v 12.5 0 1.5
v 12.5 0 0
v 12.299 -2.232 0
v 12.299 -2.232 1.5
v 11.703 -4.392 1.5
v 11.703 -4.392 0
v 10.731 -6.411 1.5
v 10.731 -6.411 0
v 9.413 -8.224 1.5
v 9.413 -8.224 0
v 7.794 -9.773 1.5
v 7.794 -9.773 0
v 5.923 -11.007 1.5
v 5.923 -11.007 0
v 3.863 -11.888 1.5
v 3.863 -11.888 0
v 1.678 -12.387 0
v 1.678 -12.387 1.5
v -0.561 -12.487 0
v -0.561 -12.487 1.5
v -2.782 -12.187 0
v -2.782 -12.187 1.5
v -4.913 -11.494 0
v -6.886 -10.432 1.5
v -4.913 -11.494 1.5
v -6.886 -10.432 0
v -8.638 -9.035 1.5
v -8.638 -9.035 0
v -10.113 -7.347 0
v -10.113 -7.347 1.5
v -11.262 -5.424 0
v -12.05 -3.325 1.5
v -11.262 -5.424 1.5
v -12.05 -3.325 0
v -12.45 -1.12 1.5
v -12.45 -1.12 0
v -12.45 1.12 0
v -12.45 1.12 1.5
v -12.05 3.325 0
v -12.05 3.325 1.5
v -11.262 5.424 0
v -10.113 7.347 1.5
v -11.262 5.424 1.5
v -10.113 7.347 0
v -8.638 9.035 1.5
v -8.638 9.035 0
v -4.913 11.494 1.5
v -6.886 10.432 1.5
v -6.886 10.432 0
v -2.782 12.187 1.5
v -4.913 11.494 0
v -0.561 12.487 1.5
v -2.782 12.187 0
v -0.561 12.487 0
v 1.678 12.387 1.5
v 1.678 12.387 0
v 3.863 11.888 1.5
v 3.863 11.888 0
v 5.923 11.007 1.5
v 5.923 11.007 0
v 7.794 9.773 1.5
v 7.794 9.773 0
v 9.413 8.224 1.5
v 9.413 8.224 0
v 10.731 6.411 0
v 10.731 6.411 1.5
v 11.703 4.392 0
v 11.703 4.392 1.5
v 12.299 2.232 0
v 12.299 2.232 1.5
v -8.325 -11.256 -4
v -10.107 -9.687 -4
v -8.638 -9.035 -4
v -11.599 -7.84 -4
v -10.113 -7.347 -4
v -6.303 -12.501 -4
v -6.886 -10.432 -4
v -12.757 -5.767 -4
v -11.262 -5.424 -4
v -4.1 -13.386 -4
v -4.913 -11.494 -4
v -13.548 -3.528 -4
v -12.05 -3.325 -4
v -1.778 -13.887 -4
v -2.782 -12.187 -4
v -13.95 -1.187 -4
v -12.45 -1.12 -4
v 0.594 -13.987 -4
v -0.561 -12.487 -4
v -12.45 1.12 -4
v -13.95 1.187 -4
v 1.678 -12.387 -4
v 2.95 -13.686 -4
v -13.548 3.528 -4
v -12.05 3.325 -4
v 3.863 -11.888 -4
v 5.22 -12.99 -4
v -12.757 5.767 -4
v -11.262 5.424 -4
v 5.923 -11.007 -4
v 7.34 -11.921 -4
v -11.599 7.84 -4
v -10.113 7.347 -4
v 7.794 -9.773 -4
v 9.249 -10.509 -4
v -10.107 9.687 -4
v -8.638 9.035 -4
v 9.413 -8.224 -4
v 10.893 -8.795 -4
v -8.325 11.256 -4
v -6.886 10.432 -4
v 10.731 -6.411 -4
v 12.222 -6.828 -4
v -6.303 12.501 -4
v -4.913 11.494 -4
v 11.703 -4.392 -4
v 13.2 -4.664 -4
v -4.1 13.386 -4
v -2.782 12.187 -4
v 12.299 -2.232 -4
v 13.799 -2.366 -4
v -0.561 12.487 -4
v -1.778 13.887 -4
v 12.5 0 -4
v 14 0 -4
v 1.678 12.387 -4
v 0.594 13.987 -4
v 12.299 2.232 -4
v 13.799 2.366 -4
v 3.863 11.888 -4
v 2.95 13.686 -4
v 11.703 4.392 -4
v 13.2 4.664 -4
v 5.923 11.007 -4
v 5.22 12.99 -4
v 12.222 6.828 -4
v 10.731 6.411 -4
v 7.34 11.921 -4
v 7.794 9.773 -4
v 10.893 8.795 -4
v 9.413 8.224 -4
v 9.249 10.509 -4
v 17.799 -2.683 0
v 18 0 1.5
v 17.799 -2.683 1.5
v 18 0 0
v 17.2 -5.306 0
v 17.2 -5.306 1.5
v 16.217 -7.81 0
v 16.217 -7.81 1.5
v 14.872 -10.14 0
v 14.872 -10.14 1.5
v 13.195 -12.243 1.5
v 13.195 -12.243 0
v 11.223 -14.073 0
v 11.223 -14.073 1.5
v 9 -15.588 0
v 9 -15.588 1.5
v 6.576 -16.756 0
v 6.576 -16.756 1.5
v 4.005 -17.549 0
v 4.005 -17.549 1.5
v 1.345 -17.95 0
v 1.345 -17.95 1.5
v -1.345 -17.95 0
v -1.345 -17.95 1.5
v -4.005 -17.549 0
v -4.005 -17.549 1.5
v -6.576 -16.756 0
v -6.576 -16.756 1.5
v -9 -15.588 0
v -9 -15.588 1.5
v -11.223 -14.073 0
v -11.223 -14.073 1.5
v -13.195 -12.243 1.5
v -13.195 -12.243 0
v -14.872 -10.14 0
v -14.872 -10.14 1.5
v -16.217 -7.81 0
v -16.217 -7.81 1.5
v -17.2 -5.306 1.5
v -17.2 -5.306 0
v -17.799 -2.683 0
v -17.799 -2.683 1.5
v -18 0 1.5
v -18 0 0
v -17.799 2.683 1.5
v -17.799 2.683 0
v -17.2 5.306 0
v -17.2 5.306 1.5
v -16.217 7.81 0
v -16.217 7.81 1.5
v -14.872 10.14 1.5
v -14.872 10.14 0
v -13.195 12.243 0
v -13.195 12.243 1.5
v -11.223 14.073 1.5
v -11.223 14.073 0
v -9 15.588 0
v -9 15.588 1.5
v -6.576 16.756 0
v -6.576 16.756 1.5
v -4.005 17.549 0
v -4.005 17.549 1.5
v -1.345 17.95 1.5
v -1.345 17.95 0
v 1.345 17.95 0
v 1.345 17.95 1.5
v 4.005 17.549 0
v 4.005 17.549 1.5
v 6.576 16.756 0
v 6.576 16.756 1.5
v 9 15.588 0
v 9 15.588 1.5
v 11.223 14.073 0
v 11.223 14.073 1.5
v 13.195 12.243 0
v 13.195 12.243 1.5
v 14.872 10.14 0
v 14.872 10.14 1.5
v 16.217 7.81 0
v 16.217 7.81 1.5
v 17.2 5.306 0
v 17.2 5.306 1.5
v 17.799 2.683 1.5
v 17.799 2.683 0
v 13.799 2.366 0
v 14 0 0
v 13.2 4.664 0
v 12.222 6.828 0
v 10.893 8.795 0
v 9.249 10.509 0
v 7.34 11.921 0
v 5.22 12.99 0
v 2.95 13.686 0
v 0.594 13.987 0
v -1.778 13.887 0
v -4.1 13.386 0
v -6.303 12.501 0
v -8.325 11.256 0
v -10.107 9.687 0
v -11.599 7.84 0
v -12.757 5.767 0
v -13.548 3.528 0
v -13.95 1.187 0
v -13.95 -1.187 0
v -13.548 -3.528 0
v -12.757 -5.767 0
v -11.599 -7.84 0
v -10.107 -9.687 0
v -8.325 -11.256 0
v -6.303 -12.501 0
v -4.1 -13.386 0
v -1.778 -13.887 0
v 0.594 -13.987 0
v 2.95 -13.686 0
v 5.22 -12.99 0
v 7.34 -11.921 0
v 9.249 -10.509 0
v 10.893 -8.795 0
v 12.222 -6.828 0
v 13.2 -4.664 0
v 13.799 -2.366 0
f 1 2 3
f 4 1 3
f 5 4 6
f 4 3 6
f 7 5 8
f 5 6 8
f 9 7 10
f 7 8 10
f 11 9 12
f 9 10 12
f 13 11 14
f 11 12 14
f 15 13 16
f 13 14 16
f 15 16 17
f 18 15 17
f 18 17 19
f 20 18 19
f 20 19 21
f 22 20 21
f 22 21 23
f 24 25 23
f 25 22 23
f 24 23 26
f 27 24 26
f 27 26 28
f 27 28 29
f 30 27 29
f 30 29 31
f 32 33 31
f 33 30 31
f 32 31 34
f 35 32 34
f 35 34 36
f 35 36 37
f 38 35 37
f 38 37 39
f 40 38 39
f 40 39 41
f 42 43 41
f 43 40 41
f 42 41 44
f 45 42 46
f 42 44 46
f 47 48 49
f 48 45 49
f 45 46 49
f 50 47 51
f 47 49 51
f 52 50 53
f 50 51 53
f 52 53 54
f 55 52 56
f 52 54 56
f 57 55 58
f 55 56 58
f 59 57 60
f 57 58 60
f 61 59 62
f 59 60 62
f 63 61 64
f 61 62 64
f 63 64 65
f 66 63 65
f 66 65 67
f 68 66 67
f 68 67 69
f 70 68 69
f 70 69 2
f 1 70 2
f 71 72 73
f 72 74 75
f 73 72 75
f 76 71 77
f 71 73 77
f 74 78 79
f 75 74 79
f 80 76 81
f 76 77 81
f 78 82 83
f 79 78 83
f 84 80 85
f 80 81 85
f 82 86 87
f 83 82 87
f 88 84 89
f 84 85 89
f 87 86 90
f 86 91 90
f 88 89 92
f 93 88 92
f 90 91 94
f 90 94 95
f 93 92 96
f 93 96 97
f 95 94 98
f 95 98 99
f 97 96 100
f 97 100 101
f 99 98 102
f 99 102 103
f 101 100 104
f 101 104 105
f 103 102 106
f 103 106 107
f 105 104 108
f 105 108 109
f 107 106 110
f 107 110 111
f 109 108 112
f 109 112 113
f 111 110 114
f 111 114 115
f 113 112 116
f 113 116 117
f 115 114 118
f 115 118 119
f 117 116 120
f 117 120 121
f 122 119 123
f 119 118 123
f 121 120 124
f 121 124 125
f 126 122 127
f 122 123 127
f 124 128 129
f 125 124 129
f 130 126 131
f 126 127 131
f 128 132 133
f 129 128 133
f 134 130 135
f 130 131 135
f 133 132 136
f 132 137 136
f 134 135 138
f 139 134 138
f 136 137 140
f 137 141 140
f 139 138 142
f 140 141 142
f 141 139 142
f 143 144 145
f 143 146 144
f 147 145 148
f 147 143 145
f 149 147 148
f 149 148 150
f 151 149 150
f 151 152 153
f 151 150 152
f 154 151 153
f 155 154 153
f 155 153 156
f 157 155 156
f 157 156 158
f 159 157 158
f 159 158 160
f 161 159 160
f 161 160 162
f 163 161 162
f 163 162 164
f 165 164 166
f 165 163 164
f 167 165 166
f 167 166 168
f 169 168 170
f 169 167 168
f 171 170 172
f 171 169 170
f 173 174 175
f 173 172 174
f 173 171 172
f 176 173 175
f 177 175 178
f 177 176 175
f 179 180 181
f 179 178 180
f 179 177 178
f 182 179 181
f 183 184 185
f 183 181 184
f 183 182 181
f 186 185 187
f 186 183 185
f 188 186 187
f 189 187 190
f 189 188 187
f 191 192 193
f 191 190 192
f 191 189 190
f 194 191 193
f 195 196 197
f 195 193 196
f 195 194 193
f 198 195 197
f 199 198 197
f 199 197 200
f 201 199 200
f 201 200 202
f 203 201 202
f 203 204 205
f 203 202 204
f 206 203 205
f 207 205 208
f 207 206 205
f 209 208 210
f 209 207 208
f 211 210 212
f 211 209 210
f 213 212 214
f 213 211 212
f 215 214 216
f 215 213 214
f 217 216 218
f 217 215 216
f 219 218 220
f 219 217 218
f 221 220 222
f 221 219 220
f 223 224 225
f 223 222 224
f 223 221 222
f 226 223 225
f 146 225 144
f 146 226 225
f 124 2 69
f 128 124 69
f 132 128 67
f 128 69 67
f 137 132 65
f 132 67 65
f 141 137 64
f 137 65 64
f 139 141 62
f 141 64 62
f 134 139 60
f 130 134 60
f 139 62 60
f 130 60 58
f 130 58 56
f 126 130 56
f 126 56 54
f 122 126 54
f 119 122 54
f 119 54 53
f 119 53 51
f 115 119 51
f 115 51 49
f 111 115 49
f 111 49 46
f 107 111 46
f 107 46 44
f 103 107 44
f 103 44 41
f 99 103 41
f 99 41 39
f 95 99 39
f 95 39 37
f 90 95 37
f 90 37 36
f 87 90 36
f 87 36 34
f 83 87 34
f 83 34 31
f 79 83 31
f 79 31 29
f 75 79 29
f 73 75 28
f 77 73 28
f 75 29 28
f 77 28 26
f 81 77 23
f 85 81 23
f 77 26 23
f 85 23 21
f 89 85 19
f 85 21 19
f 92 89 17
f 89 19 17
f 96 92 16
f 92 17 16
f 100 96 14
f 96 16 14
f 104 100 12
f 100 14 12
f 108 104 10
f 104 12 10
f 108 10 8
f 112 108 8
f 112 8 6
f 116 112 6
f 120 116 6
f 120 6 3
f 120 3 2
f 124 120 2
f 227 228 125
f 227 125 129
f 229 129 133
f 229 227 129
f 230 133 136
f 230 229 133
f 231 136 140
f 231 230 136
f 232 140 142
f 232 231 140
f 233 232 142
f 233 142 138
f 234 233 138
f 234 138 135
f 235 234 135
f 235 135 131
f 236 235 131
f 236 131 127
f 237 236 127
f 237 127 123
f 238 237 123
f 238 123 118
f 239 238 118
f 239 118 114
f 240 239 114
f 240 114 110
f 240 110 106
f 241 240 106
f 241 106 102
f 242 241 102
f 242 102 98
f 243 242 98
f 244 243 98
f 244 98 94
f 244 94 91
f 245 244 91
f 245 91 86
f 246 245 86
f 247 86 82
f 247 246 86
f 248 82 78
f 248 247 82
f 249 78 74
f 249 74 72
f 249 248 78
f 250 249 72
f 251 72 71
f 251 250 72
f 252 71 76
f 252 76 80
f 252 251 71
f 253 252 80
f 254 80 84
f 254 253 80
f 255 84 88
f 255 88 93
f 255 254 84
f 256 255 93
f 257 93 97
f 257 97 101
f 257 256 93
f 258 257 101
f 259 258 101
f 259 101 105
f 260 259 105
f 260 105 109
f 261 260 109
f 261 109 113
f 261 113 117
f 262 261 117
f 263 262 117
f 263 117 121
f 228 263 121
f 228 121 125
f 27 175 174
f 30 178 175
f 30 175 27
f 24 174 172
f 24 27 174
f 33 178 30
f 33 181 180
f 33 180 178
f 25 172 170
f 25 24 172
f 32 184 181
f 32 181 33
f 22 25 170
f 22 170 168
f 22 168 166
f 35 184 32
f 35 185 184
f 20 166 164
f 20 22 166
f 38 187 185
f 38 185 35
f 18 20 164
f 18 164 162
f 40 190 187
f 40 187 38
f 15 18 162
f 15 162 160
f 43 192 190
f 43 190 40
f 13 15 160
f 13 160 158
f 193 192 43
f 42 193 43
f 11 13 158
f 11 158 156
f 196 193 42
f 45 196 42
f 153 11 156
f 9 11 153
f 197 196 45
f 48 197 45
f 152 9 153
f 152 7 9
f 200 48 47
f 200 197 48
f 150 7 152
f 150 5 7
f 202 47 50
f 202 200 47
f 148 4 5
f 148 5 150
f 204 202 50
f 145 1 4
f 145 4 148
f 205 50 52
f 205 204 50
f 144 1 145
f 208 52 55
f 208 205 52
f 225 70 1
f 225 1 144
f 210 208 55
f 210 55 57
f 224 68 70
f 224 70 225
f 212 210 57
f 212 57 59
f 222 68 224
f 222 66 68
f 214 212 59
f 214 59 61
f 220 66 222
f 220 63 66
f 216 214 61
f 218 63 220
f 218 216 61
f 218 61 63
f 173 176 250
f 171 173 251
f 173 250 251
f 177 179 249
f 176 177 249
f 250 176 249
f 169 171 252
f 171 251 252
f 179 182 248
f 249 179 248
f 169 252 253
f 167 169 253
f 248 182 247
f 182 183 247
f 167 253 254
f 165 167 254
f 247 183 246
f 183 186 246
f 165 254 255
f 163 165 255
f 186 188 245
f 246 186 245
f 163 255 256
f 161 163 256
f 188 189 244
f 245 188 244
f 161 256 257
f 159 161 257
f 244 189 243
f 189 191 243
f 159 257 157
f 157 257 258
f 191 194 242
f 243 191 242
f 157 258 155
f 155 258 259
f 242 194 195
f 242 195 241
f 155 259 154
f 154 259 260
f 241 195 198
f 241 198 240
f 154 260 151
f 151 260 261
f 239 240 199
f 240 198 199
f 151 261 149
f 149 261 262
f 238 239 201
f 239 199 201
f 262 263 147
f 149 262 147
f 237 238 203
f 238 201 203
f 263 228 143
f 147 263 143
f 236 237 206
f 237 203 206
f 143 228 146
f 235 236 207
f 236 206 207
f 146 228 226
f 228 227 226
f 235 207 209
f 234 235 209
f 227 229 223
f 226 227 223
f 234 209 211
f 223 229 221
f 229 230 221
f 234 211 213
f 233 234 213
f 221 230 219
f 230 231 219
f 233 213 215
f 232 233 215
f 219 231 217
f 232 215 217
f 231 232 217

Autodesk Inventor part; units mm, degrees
ref_plane "YZ Plane" through (0, 0, 0) normal (1, 0, 0) x (0, 1, 0)
ref_plane "XZ Plane" through (0, 0, 0) normal (0, 1, 0) x (-1, 0, 0)
ref_plane "XY Plane" through (0, 0, 0) normal (0, 0, 1) x (1, 0, 0)
sketch "スケッチ1" plane through (0, 0, 0) normal (0, 0, 1) x (1, 0, 0)
  circle A0 centre (0, 0) radius 12.5
  circle A1 centre (0, 0) radius 14
  circle A2 centre (0, 0) radius 18
  dimension "d0" = 25
  dimension "d1" = 28
  dimension "d2" = 36
extrude "押し出し1" add sketch "スケッチ1" along normal blind 1.5 contours A1 | A2
extrude "押し出し2" add sketch "スケッチ1" against normal blind 4 contours A1
properties part number "オイレスF　d25-D28-l12" material "アセタール樹脂、黒"
